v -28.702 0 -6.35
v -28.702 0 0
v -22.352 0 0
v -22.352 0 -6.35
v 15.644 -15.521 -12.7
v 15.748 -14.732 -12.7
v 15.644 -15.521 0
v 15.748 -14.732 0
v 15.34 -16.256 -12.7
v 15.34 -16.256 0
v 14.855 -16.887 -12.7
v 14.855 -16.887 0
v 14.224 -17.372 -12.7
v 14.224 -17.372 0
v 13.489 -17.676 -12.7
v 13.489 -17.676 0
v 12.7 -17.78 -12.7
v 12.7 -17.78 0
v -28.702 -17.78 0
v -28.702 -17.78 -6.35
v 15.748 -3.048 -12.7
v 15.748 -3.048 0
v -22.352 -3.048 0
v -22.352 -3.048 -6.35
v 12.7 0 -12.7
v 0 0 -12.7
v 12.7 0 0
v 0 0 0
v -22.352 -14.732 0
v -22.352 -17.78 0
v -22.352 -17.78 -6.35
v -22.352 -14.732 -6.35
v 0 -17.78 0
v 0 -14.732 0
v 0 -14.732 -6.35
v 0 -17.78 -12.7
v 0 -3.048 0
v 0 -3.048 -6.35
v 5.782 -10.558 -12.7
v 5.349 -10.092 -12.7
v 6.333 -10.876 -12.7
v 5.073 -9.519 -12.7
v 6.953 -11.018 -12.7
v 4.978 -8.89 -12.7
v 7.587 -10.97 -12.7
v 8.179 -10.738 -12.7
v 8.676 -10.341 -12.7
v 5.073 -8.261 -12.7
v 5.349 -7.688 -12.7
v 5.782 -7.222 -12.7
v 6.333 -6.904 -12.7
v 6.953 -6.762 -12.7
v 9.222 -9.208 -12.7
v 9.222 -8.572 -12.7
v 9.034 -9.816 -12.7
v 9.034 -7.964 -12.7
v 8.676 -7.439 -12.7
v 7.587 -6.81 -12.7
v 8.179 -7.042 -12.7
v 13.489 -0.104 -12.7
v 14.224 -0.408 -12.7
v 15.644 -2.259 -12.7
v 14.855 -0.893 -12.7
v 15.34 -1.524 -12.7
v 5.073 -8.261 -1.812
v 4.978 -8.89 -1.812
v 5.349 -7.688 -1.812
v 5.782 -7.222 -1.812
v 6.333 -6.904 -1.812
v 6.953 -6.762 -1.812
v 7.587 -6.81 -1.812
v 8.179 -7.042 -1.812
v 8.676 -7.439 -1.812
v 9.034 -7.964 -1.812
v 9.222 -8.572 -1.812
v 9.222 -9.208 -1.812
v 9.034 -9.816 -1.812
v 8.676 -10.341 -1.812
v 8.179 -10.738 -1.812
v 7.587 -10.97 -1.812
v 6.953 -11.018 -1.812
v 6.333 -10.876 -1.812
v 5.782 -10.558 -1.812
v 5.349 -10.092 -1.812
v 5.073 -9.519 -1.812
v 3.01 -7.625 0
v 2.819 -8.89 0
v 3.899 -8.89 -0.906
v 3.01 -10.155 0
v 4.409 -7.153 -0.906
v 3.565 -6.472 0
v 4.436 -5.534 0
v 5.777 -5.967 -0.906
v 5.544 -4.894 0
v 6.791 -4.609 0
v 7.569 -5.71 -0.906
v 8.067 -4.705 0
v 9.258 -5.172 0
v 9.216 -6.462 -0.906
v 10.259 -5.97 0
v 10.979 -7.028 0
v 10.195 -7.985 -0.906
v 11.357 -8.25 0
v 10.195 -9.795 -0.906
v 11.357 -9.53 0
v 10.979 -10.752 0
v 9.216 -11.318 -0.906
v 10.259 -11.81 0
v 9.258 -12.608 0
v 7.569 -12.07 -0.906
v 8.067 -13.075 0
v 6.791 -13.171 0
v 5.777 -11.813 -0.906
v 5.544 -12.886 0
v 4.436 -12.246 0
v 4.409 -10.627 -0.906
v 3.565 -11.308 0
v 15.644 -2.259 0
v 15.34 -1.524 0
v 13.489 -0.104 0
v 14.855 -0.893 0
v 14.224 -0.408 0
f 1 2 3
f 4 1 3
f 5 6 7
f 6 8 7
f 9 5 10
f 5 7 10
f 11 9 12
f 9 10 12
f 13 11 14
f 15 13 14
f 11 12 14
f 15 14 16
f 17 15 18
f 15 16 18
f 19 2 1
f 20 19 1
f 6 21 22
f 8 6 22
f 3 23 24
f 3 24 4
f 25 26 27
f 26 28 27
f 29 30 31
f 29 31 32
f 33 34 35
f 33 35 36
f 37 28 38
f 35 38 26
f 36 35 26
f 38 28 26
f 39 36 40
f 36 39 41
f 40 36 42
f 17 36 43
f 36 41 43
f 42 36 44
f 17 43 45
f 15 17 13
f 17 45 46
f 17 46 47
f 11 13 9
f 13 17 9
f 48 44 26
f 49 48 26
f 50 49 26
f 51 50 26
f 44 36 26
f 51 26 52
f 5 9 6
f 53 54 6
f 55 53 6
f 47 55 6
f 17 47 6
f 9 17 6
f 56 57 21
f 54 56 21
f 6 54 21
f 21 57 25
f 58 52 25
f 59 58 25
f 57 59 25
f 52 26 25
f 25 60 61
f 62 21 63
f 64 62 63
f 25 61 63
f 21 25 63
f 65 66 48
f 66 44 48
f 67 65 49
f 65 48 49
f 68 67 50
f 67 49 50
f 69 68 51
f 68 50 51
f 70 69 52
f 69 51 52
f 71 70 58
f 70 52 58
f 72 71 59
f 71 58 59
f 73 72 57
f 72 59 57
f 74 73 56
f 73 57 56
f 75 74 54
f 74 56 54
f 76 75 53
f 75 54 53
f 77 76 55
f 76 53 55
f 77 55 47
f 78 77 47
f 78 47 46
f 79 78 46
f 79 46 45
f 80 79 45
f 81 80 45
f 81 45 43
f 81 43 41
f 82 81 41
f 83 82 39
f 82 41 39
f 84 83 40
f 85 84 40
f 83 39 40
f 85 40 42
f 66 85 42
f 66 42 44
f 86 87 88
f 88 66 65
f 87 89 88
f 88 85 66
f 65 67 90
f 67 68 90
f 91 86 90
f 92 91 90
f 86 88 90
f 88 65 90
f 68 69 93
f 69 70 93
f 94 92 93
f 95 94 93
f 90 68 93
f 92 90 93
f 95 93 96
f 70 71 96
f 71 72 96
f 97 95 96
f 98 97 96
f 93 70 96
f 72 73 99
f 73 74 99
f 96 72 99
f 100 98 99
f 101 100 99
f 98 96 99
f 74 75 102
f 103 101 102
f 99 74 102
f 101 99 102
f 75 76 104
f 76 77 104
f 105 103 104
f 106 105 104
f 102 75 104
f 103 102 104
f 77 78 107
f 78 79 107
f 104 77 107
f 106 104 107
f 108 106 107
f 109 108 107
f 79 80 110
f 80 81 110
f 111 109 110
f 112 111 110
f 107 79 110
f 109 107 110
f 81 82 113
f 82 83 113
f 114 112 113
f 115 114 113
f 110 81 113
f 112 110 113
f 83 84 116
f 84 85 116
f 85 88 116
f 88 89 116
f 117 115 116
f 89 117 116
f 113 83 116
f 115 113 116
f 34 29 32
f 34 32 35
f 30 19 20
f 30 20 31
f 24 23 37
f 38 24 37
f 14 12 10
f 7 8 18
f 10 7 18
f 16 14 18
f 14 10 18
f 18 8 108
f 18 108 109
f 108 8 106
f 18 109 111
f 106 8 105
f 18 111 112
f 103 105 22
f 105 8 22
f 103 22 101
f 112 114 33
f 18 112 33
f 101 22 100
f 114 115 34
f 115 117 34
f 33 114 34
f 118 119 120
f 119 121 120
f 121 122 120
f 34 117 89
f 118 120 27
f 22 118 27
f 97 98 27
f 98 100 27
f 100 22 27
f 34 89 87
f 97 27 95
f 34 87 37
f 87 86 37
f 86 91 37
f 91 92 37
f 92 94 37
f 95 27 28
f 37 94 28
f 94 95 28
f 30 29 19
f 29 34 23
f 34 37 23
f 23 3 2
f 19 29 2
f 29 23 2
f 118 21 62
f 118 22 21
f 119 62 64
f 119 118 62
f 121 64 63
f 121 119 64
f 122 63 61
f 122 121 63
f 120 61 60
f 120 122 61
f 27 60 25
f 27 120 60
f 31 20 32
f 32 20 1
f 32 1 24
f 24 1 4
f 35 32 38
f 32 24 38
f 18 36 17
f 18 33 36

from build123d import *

# Parameters (mm, degrees)
F1_DEPTH       = 17.78
F2_W           = 22.352
F2_H           = 7.714197
F2_H_2         = 6.145762
F3_DEPTH       = 12.701
F4_R           = 3.048
F6_D           = 4.2672
F6_CSINK_D     = 8.5852
F6_CSINK_ANGLE = 100


with BuildPart() as f1:
    # F0 (on Front) → F1 (new body)
    with BuildSketch(Plane.XZ):
        Polygon((15.748, -12.7), (15.748, 0), (-28.702, 0), (-28.702, -6.35), (0, -6.35), (0, -12.7), align=None)
    extrude(amount=F1_DEPTH)

    # F2 (on face) → F3 (cut, through all)
    with BuildSketch(Plane.XY):
        with Locations((-11.176, -18.589098)):
            Rectangle(F2_W, F2_H)
        with Locations((-11.176, 0.024881)):
            Rectangle(F2_W, F2_H_2)
    extrude(amount=-F3_DEPTH, mode=Mode.SUBTRACT)

    # F4
    f4_edges = [f1.edges().sort_by_distance(p)[0] for p in [
        (15.748, 0, -6.35),
        (15.748, -17.78, -6.35),
    ]]
    fillet(f4_edges, radius=F4_R)

    # F6 (through all)
    with Locations(Plane.XY):
        with Locations((7.112, -8.89)):
            CounterSinkHole(F6_D / 2, F6_CSINK_D / 2, counter_sink_angle=F6_CSINK_ANGLE)


solid = f1.part
